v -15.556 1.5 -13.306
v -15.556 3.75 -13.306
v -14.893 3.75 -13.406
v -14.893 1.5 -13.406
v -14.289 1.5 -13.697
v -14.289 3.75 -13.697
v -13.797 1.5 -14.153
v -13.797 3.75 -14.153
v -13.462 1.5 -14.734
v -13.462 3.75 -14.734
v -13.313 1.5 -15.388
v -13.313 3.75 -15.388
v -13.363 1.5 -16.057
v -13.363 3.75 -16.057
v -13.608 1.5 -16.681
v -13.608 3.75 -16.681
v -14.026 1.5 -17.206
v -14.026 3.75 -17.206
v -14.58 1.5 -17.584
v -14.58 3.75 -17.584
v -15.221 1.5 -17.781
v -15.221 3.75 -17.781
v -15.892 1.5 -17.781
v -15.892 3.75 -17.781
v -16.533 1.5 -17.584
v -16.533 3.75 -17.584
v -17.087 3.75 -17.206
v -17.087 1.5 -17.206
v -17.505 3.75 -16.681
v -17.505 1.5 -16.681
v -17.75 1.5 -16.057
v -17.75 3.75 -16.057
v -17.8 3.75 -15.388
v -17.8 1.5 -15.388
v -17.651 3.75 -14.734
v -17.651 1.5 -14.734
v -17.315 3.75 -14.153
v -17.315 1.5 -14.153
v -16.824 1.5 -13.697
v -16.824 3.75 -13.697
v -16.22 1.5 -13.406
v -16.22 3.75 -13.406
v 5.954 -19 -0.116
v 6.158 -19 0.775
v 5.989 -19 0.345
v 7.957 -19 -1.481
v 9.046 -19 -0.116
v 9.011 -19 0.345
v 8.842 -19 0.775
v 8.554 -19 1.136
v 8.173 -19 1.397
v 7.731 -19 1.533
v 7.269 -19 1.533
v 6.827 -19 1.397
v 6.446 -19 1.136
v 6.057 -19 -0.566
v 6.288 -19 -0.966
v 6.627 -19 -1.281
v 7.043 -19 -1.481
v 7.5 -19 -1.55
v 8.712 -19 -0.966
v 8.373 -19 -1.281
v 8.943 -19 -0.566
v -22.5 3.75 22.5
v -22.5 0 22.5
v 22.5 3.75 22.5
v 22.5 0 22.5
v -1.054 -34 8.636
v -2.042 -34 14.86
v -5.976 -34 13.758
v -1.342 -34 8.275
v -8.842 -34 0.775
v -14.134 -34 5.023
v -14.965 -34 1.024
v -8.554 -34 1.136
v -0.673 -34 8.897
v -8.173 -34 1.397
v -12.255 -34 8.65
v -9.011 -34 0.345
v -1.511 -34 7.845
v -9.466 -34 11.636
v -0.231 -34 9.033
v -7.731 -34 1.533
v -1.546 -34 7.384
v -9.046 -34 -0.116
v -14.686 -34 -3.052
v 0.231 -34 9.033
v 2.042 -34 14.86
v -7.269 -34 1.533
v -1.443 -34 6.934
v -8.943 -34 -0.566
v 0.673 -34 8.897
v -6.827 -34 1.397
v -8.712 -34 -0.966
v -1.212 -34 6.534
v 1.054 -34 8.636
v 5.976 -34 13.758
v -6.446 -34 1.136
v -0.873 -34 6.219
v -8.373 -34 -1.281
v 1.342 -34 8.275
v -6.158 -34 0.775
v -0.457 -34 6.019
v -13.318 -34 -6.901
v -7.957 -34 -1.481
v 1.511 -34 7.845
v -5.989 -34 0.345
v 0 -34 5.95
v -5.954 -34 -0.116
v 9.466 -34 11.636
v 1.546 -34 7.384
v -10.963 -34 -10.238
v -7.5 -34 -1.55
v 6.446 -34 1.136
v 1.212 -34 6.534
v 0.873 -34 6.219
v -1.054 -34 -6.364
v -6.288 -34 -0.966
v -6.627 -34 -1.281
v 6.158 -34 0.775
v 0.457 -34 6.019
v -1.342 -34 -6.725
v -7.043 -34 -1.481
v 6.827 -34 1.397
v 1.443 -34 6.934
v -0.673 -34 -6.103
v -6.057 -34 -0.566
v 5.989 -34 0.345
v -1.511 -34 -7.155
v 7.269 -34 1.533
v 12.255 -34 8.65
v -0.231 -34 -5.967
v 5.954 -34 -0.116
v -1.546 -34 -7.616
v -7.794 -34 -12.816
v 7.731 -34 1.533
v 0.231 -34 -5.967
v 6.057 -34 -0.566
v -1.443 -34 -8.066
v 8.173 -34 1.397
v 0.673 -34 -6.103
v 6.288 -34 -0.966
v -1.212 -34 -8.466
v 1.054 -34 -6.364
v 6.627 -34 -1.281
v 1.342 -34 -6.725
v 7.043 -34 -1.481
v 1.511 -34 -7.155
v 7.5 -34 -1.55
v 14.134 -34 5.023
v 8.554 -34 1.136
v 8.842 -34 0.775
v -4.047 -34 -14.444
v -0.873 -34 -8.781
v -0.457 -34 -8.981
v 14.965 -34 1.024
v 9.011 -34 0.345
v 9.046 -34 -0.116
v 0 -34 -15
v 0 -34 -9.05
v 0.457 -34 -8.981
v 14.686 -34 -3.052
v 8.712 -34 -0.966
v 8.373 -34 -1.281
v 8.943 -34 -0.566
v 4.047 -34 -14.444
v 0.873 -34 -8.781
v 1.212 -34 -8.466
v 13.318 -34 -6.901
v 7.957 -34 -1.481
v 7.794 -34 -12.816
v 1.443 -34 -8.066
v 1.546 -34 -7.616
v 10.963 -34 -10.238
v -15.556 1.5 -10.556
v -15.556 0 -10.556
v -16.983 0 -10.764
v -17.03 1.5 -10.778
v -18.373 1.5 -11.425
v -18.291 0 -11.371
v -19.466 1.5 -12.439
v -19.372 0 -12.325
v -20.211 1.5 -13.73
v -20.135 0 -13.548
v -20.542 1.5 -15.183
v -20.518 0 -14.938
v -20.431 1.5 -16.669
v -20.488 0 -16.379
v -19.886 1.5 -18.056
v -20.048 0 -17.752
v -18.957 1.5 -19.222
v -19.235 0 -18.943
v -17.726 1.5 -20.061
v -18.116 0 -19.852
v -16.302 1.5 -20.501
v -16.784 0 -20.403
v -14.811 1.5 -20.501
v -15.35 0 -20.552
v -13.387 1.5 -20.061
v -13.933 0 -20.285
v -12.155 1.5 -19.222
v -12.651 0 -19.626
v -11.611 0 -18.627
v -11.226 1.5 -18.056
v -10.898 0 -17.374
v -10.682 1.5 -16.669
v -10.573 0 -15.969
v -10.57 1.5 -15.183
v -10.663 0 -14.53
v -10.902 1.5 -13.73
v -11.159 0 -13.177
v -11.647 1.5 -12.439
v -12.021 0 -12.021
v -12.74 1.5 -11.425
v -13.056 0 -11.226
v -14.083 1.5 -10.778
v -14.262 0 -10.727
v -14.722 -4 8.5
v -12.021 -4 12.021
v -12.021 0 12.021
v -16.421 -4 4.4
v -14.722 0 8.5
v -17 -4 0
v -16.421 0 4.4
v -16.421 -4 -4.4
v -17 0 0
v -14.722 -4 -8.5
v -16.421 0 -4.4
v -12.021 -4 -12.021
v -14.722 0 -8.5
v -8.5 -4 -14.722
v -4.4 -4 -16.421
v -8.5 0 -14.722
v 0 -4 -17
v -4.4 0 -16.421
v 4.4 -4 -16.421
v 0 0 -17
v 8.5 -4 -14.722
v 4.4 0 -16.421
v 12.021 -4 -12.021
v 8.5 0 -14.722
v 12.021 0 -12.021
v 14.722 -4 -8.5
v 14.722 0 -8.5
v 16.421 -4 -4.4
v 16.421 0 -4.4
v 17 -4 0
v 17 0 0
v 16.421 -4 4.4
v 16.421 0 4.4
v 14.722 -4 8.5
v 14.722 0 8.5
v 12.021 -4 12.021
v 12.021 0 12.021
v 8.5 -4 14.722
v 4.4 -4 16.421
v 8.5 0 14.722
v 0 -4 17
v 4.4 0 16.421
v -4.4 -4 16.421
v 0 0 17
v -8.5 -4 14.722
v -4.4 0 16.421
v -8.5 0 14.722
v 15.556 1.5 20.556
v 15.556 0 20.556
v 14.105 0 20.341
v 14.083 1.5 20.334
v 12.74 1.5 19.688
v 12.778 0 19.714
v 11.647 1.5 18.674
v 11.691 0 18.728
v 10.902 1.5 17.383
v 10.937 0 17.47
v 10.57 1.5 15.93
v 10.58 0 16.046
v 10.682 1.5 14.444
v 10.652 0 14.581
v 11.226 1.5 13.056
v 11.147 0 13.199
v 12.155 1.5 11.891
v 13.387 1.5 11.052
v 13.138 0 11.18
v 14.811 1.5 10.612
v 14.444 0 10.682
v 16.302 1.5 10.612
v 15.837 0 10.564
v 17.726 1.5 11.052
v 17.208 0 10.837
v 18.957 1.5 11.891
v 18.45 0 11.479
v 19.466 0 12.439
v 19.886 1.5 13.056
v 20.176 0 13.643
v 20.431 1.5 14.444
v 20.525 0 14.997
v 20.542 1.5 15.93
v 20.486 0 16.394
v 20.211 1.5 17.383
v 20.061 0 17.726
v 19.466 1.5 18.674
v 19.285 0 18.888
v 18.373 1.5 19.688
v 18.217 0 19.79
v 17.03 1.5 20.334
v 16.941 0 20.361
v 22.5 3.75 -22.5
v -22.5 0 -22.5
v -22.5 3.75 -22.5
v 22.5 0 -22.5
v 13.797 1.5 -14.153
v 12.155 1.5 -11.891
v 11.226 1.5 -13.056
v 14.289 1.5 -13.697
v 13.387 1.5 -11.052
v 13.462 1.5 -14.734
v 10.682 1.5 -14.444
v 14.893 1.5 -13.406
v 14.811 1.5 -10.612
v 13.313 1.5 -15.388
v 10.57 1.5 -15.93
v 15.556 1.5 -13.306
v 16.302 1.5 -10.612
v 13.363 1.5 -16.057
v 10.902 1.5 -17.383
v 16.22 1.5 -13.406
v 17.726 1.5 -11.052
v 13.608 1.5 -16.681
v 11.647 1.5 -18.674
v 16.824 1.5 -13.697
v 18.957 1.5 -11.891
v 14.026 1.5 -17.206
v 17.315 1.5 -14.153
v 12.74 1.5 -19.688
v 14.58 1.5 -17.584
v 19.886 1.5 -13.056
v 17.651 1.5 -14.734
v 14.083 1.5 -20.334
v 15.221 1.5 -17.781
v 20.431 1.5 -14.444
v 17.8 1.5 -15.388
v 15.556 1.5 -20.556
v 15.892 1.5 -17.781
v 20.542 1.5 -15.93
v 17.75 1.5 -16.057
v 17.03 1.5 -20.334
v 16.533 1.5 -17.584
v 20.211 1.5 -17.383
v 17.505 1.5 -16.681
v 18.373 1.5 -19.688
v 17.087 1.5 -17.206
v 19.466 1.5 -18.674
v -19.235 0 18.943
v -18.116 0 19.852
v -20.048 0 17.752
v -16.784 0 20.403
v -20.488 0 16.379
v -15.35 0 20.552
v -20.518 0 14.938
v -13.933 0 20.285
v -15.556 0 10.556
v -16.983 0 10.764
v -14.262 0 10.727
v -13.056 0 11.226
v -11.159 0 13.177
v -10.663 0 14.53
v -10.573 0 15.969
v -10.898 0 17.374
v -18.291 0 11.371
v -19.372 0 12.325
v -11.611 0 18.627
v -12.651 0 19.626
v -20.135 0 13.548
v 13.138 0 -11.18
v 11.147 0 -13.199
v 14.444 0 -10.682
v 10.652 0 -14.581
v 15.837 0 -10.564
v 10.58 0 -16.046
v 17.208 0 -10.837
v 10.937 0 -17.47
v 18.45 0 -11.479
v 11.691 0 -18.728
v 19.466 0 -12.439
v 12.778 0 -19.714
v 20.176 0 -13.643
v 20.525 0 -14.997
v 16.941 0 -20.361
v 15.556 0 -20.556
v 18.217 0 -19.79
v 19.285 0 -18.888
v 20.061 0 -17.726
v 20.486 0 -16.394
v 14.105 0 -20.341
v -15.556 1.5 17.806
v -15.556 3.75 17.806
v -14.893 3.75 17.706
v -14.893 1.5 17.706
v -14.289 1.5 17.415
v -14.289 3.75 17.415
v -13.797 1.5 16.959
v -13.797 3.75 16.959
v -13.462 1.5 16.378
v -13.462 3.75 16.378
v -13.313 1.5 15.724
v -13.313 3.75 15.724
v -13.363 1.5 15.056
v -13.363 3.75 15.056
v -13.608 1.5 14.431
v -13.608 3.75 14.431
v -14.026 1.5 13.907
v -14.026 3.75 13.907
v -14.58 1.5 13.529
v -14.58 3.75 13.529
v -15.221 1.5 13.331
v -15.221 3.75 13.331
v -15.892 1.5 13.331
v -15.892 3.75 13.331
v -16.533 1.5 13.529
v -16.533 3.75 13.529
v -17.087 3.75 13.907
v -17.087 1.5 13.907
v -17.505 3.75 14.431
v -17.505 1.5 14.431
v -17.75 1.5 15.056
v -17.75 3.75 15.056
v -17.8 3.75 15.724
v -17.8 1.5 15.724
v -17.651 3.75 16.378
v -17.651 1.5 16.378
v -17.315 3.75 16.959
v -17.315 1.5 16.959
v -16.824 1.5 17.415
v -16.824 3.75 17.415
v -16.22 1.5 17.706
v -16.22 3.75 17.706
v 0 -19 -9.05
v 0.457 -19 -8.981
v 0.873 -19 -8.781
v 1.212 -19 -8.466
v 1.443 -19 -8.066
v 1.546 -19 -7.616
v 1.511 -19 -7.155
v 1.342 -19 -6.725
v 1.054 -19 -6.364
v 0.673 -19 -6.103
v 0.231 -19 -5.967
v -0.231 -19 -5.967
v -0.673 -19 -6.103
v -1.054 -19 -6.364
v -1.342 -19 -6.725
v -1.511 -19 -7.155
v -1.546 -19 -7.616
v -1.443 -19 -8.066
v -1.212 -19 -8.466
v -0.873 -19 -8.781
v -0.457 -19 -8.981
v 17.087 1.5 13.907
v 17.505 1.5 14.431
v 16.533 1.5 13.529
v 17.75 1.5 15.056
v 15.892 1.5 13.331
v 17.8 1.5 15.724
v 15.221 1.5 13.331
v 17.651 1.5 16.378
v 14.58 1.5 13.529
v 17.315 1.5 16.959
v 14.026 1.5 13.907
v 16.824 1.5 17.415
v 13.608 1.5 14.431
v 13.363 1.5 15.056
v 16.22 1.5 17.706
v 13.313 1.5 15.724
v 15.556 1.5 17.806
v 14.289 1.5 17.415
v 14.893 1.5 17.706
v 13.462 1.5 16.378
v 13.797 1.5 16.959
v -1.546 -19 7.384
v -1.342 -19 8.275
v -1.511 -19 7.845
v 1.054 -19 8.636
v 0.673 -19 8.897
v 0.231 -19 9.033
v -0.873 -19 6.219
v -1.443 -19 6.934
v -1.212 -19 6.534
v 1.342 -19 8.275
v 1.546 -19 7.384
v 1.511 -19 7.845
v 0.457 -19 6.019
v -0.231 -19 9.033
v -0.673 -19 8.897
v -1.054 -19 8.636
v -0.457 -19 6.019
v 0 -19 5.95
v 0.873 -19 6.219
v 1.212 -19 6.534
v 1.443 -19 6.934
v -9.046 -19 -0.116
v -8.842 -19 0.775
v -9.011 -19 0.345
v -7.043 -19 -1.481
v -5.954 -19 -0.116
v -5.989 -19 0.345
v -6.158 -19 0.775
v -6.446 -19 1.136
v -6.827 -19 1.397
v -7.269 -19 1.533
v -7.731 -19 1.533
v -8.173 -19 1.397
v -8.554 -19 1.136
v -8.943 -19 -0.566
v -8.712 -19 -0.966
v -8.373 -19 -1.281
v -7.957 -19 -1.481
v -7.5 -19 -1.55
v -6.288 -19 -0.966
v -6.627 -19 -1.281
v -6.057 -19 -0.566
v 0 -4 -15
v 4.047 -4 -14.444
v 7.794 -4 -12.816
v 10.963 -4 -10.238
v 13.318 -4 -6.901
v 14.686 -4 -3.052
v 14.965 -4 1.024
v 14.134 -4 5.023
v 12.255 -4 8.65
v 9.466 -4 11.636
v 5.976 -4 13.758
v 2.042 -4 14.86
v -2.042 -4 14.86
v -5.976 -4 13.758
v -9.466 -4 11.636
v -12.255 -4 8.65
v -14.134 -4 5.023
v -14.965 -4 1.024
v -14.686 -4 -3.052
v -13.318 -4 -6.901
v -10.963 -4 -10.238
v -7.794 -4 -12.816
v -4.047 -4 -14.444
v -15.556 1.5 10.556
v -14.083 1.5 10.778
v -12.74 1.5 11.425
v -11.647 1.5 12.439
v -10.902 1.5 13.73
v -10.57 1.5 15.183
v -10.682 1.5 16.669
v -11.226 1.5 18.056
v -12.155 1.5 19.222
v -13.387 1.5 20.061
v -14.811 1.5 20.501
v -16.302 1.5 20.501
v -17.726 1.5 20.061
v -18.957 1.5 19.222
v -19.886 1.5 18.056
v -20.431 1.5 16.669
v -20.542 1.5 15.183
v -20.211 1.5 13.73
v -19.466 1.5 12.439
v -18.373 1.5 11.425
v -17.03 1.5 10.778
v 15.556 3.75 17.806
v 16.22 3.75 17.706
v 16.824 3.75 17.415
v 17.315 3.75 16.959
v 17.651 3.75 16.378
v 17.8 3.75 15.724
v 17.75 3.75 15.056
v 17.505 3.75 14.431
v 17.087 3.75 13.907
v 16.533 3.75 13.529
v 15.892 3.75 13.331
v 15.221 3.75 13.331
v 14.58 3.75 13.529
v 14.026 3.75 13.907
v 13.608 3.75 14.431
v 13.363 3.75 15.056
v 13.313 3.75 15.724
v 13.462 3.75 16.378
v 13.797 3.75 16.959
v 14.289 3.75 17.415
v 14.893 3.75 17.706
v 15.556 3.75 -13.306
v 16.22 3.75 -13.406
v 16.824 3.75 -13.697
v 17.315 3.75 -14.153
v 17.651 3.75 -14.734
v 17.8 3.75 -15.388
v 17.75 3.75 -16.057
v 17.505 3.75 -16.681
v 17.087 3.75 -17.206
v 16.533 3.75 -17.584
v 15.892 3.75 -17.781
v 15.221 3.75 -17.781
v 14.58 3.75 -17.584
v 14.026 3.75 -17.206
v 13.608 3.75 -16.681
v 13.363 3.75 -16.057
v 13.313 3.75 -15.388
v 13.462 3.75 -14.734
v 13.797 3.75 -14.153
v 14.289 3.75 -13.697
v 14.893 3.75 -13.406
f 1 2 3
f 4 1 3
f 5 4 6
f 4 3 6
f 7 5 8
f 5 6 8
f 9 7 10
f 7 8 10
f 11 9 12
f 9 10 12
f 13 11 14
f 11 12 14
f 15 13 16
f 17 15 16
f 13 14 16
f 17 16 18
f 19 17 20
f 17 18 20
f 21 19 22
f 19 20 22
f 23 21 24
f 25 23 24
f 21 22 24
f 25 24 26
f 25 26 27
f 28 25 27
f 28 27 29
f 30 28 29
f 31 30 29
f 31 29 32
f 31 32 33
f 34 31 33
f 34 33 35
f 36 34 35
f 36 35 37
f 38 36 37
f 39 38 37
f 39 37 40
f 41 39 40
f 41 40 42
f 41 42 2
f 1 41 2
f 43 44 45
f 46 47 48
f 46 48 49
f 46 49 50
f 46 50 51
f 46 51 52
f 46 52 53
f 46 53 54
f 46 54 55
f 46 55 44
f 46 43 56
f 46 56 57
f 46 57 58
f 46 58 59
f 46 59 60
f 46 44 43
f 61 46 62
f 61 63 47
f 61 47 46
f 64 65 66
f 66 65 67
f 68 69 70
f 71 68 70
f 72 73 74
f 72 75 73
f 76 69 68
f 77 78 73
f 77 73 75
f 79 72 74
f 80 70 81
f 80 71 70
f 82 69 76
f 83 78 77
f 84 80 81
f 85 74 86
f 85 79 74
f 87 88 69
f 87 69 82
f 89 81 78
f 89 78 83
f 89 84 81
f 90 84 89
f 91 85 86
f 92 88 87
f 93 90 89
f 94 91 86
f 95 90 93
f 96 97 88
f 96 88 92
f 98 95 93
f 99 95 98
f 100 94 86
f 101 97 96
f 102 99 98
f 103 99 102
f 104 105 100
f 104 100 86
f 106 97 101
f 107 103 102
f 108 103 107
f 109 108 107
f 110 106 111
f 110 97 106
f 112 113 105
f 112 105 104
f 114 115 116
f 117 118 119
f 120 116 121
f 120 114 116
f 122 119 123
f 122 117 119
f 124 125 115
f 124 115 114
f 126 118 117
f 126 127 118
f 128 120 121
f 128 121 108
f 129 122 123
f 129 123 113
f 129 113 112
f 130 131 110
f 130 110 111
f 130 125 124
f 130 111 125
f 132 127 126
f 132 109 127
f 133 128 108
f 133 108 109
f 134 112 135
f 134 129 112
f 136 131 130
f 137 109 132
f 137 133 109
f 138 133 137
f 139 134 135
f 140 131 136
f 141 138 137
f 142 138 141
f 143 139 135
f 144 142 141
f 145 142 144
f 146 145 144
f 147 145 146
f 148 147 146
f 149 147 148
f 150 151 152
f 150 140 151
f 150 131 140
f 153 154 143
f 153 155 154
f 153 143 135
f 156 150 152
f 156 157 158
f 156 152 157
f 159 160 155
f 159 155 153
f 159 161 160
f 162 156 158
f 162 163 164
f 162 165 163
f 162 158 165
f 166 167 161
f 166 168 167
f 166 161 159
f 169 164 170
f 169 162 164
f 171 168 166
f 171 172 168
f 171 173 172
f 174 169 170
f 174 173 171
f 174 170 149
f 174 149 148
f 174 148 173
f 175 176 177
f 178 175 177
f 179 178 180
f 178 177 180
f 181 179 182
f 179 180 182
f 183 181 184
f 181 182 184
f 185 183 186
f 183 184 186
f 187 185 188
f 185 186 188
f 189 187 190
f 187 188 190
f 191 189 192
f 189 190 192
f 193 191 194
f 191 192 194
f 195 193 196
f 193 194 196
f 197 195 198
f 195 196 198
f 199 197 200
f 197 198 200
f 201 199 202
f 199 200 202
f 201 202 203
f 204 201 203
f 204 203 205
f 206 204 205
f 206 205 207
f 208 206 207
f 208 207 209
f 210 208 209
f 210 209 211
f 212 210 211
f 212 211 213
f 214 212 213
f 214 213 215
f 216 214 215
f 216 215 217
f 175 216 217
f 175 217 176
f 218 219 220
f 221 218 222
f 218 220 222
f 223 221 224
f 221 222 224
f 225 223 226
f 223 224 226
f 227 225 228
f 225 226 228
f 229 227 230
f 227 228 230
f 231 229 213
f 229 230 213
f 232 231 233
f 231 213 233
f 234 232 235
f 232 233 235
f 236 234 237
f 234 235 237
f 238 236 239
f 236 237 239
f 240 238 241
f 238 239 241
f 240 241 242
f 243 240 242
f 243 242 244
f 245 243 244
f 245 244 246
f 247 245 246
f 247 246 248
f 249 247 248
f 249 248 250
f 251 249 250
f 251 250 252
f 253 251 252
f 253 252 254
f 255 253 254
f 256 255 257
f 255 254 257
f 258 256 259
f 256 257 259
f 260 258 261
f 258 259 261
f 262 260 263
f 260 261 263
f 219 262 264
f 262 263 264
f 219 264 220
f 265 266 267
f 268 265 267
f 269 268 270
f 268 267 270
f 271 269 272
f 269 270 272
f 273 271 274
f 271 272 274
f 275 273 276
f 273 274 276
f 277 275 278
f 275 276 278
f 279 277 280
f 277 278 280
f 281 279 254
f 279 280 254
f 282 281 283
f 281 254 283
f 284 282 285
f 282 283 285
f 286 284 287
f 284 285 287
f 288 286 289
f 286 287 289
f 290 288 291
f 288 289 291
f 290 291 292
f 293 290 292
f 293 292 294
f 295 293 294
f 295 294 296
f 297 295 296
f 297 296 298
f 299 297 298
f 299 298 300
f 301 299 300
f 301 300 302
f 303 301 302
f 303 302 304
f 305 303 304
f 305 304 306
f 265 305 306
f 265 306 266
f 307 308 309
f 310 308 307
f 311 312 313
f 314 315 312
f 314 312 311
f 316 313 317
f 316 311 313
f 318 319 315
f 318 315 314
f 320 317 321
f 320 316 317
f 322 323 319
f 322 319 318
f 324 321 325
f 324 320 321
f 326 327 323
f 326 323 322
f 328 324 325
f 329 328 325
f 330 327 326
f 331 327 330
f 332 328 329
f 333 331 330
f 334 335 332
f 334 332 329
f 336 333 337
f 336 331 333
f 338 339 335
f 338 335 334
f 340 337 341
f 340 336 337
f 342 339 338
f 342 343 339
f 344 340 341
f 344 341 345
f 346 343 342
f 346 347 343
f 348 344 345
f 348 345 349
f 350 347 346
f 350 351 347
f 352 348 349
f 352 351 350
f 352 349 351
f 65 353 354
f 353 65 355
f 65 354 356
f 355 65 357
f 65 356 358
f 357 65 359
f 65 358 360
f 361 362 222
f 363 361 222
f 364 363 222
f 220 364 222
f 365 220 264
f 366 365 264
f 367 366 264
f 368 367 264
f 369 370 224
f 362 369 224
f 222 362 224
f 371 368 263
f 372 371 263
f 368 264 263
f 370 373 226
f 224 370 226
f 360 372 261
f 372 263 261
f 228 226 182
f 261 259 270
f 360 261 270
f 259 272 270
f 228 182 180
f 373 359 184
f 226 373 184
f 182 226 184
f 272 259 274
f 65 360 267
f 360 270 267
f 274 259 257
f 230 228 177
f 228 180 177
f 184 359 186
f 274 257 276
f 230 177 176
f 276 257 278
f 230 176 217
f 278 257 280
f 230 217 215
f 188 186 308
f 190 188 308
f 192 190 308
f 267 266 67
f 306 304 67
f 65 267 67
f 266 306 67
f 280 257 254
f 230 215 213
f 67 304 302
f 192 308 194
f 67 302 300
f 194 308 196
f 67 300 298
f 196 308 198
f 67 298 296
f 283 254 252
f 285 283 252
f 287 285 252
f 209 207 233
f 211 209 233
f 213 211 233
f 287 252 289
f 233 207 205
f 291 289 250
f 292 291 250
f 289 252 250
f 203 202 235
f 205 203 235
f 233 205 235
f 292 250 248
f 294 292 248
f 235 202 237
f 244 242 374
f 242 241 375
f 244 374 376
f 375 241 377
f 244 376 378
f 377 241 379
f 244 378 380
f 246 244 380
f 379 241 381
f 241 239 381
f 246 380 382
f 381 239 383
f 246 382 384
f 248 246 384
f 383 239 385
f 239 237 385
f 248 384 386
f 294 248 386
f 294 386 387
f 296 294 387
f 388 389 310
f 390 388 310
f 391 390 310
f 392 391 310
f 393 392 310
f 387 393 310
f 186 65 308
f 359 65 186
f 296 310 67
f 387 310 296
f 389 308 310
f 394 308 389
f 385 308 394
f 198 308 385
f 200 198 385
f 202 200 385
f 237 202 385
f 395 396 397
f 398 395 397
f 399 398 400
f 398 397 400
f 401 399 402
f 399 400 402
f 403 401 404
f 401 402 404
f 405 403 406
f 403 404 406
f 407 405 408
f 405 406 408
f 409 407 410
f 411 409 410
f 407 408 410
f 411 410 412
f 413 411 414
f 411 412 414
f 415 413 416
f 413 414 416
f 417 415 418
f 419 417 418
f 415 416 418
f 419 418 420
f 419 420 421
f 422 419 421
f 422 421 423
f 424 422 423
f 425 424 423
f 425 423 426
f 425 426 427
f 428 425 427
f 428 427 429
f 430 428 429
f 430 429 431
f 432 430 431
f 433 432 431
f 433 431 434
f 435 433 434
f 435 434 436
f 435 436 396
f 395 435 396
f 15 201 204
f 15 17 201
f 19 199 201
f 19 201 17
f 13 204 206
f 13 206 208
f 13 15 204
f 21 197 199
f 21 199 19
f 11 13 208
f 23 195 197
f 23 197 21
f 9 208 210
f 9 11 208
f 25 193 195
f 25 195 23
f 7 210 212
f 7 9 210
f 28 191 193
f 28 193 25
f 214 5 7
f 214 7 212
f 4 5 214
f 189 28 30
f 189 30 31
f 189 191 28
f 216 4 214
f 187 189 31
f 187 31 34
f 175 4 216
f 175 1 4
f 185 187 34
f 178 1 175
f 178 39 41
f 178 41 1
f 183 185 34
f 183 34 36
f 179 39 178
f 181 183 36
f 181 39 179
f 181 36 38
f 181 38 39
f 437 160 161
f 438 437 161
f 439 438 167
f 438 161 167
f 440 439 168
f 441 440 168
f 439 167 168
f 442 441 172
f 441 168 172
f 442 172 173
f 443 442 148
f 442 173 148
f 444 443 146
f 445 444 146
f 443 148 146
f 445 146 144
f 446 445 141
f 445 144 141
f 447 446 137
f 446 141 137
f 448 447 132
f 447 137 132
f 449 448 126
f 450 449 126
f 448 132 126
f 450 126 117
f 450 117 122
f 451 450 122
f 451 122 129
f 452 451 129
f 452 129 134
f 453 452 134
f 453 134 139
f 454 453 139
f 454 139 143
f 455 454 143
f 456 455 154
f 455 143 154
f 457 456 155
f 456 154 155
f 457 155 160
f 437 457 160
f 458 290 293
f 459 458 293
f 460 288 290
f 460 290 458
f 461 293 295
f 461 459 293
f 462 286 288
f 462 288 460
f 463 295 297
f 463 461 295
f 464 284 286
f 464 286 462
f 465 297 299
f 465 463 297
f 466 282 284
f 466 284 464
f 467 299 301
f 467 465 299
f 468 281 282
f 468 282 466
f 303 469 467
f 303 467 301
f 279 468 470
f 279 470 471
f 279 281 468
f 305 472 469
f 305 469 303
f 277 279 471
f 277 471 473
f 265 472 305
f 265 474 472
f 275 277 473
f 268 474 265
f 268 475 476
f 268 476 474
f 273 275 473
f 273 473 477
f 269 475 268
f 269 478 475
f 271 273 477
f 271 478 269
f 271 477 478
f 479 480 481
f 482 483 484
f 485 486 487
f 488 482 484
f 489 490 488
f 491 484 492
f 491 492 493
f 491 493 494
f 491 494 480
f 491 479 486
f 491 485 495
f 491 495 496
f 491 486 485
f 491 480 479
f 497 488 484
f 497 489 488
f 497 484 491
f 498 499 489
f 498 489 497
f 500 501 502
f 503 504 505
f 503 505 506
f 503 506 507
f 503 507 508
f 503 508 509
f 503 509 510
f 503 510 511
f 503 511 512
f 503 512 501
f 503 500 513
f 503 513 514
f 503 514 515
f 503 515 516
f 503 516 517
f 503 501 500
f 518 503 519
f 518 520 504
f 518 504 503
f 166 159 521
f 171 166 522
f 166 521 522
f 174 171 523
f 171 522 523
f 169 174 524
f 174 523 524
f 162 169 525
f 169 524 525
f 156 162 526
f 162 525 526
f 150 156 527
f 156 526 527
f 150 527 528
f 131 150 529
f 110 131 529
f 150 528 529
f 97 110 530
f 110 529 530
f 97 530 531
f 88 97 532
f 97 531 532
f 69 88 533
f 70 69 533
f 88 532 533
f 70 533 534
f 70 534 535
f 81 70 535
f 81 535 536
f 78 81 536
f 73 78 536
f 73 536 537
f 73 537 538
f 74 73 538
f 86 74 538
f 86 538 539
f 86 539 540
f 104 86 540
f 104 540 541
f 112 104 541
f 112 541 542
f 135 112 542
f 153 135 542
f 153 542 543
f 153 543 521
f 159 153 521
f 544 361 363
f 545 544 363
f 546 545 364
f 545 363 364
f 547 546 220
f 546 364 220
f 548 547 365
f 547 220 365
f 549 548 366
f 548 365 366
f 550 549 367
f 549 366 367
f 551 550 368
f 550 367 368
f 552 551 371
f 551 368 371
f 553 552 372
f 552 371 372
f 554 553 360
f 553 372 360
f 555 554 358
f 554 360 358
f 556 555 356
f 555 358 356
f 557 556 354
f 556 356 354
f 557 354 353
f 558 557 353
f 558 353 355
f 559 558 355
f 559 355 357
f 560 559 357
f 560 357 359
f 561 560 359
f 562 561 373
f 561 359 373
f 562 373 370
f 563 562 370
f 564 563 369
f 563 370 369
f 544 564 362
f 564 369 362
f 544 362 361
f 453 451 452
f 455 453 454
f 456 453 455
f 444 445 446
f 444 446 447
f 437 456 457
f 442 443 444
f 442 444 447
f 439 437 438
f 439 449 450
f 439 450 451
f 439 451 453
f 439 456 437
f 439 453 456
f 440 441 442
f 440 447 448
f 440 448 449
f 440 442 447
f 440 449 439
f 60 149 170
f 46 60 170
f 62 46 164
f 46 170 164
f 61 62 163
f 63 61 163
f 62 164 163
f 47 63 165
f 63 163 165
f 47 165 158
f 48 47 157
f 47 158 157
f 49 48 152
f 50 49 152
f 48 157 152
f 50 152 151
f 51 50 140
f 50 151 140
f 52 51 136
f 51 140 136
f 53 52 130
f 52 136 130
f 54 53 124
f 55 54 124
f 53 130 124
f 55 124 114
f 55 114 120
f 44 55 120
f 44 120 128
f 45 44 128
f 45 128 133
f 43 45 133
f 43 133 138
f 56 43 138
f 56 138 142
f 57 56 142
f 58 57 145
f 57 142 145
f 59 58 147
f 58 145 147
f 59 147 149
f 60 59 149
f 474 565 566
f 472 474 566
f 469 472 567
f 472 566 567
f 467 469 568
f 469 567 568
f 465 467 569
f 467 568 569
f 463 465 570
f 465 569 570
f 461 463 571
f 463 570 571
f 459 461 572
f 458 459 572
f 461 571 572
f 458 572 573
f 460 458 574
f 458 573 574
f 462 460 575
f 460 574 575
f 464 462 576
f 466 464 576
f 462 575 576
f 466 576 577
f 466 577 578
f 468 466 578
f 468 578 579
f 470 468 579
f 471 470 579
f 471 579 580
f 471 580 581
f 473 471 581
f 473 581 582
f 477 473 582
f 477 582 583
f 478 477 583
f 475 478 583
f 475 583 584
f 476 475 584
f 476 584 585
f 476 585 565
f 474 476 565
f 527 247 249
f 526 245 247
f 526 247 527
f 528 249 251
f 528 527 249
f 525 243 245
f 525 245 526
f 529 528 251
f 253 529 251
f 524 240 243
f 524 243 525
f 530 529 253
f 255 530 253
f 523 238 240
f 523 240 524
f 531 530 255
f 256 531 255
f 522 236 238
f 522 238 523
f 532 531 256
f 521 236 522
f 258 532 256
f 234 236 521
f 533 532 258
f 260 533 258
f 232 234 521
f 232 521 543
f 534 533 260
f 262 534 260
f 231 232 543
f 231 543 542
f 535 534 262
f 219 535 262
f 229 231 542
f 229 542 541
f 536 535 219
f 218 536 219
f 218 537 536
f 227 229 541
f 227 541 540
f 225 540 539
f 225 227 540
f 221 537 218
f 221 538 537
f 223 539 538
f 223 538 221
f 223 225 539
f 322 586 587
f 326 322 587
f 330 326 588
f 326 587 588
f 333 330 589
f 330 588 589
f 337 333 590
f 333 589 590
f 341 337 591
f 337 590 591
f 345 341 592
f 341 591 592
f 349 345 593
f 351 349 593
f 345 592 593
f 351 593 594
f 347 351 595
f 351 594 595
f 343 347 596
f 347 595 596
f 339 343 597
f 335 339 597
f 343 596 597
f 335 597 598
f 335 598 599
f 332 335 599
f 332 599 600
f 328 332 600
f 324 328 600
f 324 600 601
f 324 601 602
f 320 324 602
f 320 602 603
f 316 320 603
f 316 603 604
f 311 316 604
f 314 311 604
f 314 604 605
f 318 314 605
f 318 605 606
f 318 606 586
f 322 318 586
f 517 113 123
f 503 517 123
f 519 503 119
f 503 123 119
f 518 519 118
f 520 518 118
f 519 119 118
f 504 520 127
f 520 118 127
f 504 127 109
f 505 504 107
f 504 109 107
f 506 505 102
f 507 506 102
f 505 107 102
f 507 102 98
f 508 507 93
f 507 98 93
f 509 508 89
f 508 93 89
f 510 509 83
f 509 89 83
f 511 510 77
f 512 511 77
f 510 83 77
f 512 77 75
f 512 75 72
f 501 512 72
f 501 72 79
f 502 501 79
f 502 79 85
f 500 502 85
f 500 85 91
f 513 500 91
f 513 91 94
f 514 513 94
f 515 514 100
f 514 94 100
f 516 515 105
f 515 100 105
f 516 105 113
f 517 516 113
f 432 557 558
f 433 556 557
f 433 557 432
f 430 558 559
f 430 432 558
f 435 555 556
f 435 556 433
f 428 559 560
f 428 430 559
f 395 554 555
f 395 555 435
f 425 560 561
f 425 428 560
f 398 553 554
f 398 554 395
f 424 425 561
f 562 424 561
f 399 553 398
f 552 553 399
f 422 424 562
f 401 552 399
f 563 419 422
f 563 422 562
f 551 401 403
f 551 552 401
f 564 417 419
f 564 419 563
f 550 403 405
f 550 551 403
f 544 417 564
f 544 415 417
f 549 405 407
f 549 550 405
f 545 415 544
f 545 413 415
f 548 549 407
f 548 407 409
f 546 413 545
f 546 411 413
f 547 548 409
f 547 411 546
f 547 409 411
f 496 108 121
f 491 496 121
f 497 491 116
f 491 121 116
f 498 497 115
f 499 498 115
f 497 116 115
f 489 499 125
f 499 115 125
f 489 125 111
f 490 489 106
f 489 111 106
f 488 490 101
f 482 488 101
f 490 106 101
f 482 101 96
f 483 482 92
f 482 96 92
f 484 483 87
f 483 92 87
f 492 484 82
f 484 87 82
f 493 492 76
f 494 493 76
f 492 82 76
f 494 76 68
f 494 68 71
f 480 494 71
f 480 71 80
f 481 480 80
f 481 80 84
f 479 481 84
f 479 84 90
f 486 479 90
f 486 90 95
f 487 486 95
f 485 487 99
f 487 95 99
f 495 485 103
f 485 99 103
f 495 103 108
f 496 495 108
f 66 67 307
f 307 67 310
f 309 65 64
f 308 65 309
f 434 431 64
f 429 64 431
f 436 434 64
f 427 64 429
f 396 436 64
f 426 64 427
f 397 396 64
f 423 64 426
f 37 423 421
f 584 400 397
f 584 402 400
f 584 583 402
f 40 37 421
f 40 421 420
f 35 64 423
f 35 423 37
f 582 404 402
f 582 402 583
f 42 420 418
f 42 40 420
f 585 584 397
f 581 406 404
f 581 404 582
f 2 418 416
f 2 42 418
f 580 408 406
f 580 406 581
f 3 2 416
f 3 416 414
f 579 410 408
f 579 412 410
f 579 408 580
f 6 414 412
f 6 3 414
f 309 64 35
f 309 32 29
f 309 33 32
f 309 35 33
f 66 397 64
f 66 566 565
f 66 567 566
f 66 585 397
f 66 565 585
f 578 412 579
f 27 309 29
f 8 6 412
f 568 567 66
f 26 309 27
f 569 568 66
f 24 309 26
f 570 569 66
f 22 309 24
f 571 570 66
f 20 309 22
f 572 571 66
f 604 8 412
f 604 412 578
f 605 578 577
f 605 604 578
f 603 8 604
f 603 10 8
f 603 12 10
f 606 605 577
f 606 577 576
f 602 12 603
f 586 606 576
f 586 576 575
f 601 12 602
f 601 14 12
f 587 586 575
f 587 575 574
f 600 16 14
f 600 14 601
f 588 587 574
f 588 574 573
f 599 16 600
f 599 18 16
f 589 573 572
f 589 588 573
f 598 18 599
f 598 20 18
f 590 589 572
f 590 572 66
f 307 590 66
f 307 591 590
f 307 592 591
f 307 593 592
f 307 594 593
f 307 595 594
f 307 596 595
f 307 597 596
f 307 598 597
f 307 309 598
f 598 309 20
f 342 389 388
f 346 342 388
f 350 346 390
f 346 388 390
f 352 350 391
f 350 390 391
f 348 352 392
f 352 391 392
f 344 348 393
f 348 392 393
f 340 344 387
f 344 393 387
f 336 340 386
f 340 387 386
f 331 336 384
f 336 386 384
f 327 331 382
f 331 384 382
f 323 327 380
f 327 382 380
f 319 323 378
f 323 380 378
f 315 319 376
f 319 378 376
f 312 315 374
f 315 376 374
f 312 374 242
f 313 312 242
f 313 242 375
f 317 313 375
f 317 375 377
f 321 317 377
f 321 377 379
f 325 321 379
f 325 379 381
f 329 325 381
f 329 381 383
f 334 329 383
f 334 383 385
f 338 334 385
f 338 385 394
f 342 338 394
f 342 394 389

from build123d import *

# Parameters (mm, degrees)
SKETCH1_W           = 45
SKETCH1_H           = 45
BOSS_EXTRUDE1_DEPTH = 3.75
SKETCH2_R           = 15
BOSS_EXTRUDE2_DEPTH = 34
SKETCH3_R           = 2.25
CUT_EXTRUDE1_DEPTH  = 50.371677103
SKETCH4_R           = 5
CUT_EXTRUDE2_DEPTH  = 1.5
SKETCH5_R           = 1.55
CUT_EXTRUDE3_DEPTH  = 15
SKETCH7_R           = 17
BOSS_EXTRUDE3_DEPTH = 4


with BuildPart() as part:
    # Sketch1 → Boss-Extrude1 (new body)
    with BuildSketch(Plane(origin=(0, 0, 0), x_dir=(1, 0, 0), z_dir=(0, 1, 0))):
        Rectangle(SKETCH1_W, SKETCH1_H)
    extrude(amount=BOSS_EXTRUDE1_DEPTH)

    # Sketch2 → Boss-Extrude2 (add)
    with BuildSketch(Plane.XZ):
        with Locations(Location((0, 0, 0), (0, 0, 270))):
            Circle(SKETCH2_R)
    extrude(amount=BOSS_EXTRUDE2_DEPTH)

    # Sketch3 → Cut-Extrude1 (cut, through all)
    with BuildSketch(Plane(origin=(0, 3.75, 0), x_dir=(1, 0, 0), z_dir=(0, 1, 0))):
        with Locations(Location((15.556349186, 15.556349186, 0), (0, 0, 270))):
            Circle(SKETCH3_R)
        with Locations(Location((15.556349186, -15.556349186, 0), (0, 0, 270))):
            Circle(SKETCH3_R)
        with Locations(Location((-15.556349186, -15.556349186, 0), (0, 0, 270))):
            Circle(SKETCH3_R)
        with Locations(Location((-15.556349186, 15.556349186, 0), (0, 0, 270))):
            Circle(SKETCH3_R)
    extrude(amount=-CUT_EXTRUDE1_DEPTH, mode=Mode.SUBTRACT)

    # Sketch4 → Cut-Extrude2 (cut)
    with BuildSketch(Plane.XZ):
        with Locations(Location((-15.556349186, 15.556349186, 0), (0, 0, 270))):
            Circle(SKETCH4_R)
        with Locations(Location((15.556349186, 15.556349186, 0), (0, 0, 90))):
            Circle(SKETCH4_R)
        with Locations(Location((15.556349186, -15.556349186, 0), (0, 0, 270))):
            Circle(SKETCH4_R)
        with Locations(Location((-15.556349186, -15.556349186, 0), (0, 0, 90))):
            Circle(SKETCH4_R)
    extrude(amount=-CUT_EXTRUDE2_DEPTH, mode=Mode.SUBTRACT)

    # Sketch5 → Cut-Extrude3 (cut)
    with BuildSketch(Plane.XZ.offset(34)):
        with Locations(Location((7.5, 0, 0), (0, 0, 270))):
            Circle(SKETCH5_R)
        with Locations(Location((0, -7.5, 0), (0, 0, 270))):
            Circle(SKETCH5_R)
        with Locations(Location((-7.5, 0, 0), (0, 0, 270))):
            Circle(SKETCH5_R)
        with Locations(Location((0, 7.5, 0), (0, 0, 270))):
            Circle(SKETCH5_R)
    extrude(amount=-CUT_EXTRUDE3_DEPTH, mode=Mode.SUBTRACT)

    # Sketch7 → Boss-Extrude3 (add)
    with BuildSketch(Plane.XZ):
        with Locations(Location((0, 0, 0), (0, 0, 134.999906315))):
            Circle(SKETCH7_R)
    extrude(amount=BOSS_EXTRUDE3_DEPTH)


solid = part.part
